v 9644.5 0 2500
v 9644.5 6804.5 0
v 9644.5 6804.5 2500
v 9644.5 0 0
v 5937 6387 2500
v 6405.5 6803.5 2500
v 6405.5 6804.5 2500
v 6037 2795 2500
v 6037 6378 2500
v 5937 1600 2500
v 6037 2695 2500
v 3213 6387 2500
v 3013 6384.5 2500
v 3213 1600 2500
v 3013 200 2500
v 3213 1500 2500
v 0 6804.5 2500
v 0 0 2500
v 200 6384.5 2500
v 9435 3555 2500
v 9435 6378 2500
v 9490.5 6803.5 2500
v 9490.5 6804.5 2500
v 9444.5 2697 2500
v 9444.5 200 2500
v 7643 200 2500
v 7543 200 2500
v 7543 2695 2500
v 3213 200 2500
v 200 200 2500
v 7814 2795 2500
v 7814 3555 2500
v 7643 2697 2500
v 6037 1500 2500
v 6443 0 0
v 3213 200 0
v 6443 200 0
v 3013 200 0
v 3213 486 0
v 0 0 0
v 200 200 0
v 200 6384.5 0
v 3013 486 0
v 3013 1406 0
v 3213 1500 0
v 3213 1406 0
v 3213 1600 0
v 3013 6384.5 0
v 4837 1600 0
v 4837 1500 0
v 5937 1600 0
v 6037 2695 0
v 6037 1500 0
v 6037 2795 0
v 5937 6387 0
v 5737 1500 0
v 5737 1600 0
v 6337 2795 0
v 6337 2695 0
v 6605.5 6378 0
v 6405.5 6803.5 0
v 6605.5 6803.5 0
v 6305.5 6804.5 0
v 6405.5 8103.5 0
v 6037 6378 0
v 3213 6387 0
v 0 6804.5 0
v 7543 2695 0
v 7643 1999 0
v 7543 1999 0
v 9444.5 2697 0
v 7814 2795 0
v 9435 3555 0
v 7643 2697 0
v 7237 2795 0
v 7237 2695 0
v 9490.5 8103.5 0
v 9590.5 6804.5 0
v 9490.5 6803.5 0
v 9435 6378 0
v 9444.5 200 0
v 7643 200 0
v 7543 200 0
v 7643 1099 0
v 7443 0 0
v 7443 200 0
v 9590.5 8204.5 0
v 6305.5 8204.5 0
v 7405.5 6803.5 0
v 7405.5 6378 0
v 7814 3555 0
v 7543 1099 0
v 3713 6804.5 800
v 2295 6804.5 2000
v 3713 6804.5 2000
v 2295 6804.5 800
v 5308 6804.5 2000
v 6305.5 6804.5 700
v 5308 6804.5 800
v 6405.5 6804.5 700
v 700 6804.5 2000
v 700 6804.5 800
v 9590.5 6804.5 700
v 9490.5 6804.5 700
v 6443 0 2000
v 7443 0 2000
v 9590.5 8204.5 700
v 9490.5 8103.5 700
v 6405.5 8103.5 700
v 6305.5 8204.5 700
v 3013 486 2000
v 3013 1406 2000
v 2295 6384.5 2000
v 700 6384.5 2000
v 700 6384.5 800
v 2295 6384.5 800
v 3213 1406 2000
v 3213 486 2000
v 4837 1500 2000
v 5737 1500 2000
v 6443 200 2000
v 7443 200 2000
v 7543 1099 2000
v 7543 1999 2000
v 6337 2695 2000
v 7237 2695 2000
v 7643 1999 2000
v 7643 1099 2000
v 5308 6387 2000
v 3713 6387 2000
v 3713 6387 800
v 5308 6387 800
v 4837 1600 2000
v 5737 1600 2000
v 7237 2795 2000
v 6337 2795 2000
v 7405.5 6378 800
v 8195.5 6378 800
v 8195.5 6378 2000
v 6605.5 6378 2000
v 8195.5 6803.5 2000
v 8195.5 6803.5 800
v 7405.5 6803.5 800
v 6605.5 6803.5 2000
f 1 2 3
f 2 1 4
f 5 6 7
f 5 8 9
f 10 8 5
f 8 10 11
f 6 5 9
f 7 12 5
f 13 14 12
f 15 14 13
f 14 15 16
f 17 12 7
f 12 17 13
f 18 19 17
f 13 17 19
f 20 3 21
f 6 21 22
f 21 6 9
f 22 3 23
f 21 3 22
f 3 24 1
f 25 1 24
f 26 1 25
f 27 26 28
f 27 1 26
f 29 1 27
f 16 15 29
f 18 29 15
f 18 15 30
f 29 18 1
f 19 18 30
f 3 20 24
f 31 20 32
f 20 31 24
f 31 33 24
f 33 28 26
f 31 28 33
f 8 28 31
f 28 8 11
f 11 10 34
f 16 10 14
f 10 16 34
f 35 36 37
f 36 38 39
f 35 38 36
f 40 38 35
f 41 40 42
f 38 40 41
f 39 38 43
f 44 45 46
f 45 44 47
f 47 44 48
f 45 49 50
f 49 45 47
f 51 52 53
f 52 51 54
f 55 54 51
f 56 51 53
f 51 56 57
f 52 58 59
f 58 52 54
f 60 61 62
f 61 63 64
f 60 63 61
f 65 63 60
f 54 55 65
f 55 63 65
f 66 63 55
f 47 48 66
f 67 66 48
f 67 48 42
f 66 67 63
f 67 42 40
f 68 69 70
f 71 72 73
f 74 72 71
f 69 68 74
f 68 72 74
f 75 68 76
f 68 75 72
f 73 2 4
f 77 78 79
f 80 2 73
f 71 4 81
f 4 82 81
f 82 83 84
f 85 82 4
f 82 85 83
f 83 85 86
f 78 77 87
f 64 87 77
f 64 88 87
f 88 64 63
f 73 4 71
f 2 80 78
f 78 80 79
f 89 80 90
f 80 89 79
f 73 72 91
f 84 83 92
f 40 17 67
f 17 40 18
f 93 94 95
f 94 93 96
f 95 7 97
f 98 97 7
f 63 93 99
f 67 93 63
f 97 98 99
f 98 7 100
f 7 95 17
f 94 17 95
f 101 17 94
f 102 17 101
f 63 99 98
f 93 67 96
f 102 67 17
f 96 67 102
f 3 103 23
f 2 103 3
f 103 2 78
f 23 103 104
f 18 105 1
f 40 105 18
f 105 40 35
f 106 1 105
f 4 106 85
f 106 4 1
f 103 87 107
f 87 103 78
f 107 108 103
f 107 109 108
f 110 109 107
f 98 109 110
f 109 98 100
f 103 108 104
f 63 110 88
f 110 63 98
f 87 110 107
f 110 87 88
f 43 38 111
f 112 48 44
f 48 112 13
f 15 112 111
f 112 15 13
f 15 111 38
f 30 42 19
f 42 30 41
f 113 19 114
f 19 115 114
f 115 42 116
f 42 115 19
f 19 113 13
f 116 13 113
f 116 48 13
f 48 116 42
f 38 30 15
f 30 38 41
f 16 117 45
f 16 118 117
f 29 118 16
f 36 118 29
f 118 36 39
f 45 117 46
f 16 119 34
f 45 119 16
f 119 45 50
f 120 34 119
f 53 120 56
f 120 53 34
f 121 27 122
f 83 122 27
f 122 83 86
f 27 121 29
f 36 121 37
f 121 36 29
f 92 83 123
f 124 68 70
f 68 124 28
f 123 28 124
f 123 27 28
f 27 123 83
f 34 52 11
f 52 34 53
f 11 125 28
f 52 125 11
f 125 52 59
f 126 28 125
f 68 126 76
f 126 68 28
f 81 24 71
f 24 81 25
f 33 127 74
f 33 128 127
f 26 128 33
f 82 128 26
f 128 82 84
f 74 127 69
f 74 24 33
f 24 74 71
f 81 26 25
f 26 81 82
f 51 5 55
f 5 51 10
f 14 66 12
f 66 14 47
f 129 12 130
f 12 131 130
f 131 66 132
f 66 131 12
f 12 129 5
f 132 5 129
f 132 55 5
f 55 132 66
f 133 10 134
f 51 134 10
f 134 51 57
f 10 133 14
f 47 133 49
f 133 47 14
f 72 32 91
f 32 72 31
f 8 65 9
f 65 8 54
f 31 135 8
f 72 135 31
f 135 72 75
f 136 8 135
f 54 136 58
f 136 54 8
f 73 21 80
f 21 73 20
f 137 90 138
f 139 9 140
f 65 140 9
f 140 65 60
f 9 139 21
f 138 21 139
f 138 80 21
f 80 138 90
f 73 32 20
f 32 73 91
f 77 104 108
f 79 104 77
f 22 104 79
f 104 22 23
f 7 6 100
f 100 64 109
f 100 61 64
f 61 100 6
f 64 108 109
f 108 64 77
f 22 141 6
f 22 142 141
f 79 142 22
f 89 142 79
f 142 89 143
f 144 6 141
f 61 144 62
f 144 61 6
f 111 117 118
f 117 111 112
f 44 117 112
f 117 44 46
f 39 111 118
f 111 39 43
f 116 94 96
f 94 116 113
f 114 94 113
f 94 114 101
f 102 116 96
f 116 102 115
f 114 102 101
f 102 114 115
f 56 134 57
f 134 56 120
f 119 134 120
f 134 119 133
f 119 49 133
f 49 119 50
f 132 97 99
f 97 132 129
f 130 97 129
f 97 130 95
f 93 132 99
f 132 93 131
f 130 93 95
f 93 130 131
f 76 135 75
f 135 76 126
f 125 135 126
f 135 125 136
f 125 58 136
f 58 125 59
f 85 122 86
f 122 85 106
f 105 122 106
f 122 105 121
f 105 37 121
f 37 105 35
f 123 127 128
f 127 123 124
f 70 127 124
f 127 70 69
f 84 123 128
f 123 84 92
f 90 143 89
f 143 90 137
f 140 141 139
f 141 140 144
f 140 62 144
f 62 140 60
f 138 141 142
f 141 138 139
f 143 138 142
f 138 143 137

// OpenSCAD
wallThick = 420;
wallMedium = 200;
wallThin = 100;

leftRoomWidth = (2809+2817)/2;
leftRoomHeight = (6185+6184)/2;
//leftRoomHeight = 1685+500+1800+500+400+1000+300;

middleRoomWidth = (2708+2740)/2;
middleRoomHeight = (4792+4782)/2;

bathroomWidth = 1798;
bathroomHeight = 2485;

coridorWidth_1 = middleRoomWidth+wallThin;
coridorHeight_1 = 1300;

coridorWidth_2 = 1506;
coridorHeight_2 = 2495;

kitchenCoridorWidth = 3398-1621; //771;	// TODO: check this value
kitchenCoridorHeight = 760;

kitchenWidth = 3398;
kitchenHeight = 2823;

bathroomWidth = (1805+1798)/2;
bathroomHeight = 2497;

balconyWidth = 3085;
balconyHeight = 1300;

innerTotalHeight = leftRoomHeight;
innerTotalWidth = leftRoomWidth + wallMedium + middleRoomWidth + wallThin + coridorWidth_2 + wallThin + bathroomWidth;
innerTotalThickness = 2500;

balconyDoorPosition = wallMedium + innerTotalWidth - kitchenWidth + 559;
balconyPosition = balconyDoorPosition - 200;

windowWidth = 1595;			// TODO: check this value;
windowThickness = 1200;		// TODO: check this value;
windowBottomOffset = 800;	// TODO: check this value;
leftWindowOffset = 500;		// TODO: check this value;
middleWindowOffset = 500;	// TODO: check this value;

doorsThickness = 2000;		// TODO: check this value;

leftRoomDoorWidth = 920;	// TODO: check this value;
leftRoomDoorOffset = 286;

middleRoomDoorWidth = 900;	// TODO: check this value;
middleRoomDoorOffset = 200;

bathroomDoorOffset = 899;
bathroomDoorWidth = 900;	// TODO: check this value;

kitchenDoorWidth = 900;		// TODO: check this value;
kitchenDoorOffset = 300;

balconyDoorWidth = 800;		// TODO: check this value;
balconyWindowWidth = 790;	// TODO: check this value;

entrenceDoorWidth = 1000;	// TODO: check this value;
entrenceDoorBathroomOffset = 100;	// TODO: check this value;


mode = "all";
balconyFenceHeight = 700;

//mode = "crossection";
//balconyFenceHeight = 2500;


if(mode == "all")
{
	all_the_walls();
}
else if(mode == "crossection")
{
	translate([0, 0, -windowBottomOffset -100])
	crossection();
}

module crossection()
{
	difference()
	{
		all_the_walls();

		translate([-10, -10, -50])
		cube([100000, 100000, windowBottomOffset + 100]);
		translate([-10, -10, windowBottomOffset + 100])
		cube([100000, 100000, 10000]);
	}
}

module all_the_walls()
{
	difference()
	{
		union()
		{
			// main body
			cube([wallMedium + innerTotalWidth+wallMedium, wallThick + innerTotalHeight + wallMedium, innerTotalThickness]);

			// balcony
			// TODO: check if balcony walls are this thick
			translate([balconyPosition - wallThin, wallMedium + innerTotalHeight + wallThick, 0])
			cube([balconyWidth + wallThin*2, balconyHeight + wallThin, balconyFenceHeight]);
		}

		// cavities
		union()
		{
			// left room
			translate([wallMedium, wallMedium, -1])
			cube([leftRoomWidth, leftRoomHeight, innerTotalThickness+2]);

			// coridor in 2 parts
			// leading to left room
			translate([wallMedium + leftRoomWidth + wallMedium, wallMedium, -1])
			cube([coridorWidth_1+1, coridorHeight_1, innerTotalThickness+2]);

			// leading to kitchen
			translate([wallMedium + leftRoomWidth + wallMedium + coridorWidth_1, wallMedium, -1])
			cube([coridorWidth_2, coridorHeight_2, innerTotalThickness+2]);

			// bathroom
			translate([wallMedium + leftRoomWidth + wallMedium + coridorWidth_1 + coridorWidth_2 + wallThin, wallMedium, -1])
			cube([bathroomWidth, bathroomHeight, innerTotalThickness+2]);

			// middle room
			translate([wallMedium + leftRoomWidth + wallMedium, wallMedium + coridorHeight_1 + wallThin, -1])
			cube([middleRoomWidth, middleRoomHeight, innerTotalThickness+2]);

			// kitchen: entrence part
			translate([wallMedium + leftRoomWidth + wallMedium + coridorWidth_1, wallMedium + coridorHeight_2 + wallThin, -1])
			cube([kitchenCoridorWidth, kitchenCoridorHeight + 1, innerTotalThickness+2]);

			// kitchen: main part
			translate([wallMedium + leftRoomWidth + wallMedium + coridorWidth_1, wallMedium + coridorHeight_2 + wallThin + kitchenCoridorHeight, -1])
			cube([kitchenWidth, kitchenHeight, innerTotalThickness+2]);

			// balcony
			translate([balconyPosition, wallMedium + innerTotalHeight + wallThick - 1, -1])
			cube([balconyWidth, balconyHeight, innerTotalThickness+2]);

			// windows and doorways
			// left room door
			translate([wallMedium + leftRoomWidth - 1, wallMedium + leftRoomDoorOffset, -1])
			cube([wallMedium + 2, leftRoomDoorWidth, doorsThickness + 1]);
			// window
			translate([wallMedium + leftWindowOffset, wallMedium + leftRoomHeight - 1, windowBottomOffset])
			cube([windowWidth, wallThick+2, windowThickness]);

			// middle room door
			translate([wallMedium + leftRoomWidth + wallMedium + middleRoomWidth - middleRoomDoorWidth - middleRoomDoorOffset, wallMedium + coridorHeight_1 - 1, -1])
			cube([middleRoomDoorWidth, wallThin + 2, doorsThickness + 1]);
			// window
			translate([wallMedium + leftRoomWidth + wallMedium + middleWindowOffset, wallMedium + leftRoomHeight - 1, windowBottomOffset])
			cube([windowWidth, wallThick+2, windowThickness]);

			// kitchen door
			translate([wallMedium + leftRoomWidth + wallMedium + coridorWidth_1 + kitchenDoorOffset, wallMedium + coridorHeight_2 - 1, -1])
			cube([kitchenDoorWidth, wallThin + 2, doorsThickness + 1]);

			// entrence door
			translate([wallMedium + leftRoomWidth + wallMedium + coridorWidth_1 + coridorWidth_2 - entrenceDoorWidth - entrenceDoorBathroomOffset, -1, -1])
			cube([entrenceDoorWidth, wallMedium + 2, doorsThickness + 1]);

			// bathroom door
			translate([wallMedium + leftRoomWidth + wallMedium + coridorWidth_1 + coridorWidth_2 -1, wallMedium + bathroomDoorOffset, -1])
			cube([wallThin + 2, bathroomDoorWidth, doorsThickness + 1]);

			// balcony door
			translate([balconyDoorPosition, wallMedium + leftRoomHeight -7, -1])	// TODO: check placement and size, wher did we get 7mm offset? wrong kitchen placement?
			cube([balconyDoorWidth, wallThick+2+7, doorsThickness + 1]);
			// window
			translate([balconyDoorPosition+balconyDoorWidth-1, wallMedium + leftRoomHeight -7, windowBottomOffset])	// TODO: check placement and size, wher did we get 7mm offset? wrong kitchen placement?
			cube([balconyWindowWidth+1, wallThick+2+7, windowThickness]);
		}
	}
}
